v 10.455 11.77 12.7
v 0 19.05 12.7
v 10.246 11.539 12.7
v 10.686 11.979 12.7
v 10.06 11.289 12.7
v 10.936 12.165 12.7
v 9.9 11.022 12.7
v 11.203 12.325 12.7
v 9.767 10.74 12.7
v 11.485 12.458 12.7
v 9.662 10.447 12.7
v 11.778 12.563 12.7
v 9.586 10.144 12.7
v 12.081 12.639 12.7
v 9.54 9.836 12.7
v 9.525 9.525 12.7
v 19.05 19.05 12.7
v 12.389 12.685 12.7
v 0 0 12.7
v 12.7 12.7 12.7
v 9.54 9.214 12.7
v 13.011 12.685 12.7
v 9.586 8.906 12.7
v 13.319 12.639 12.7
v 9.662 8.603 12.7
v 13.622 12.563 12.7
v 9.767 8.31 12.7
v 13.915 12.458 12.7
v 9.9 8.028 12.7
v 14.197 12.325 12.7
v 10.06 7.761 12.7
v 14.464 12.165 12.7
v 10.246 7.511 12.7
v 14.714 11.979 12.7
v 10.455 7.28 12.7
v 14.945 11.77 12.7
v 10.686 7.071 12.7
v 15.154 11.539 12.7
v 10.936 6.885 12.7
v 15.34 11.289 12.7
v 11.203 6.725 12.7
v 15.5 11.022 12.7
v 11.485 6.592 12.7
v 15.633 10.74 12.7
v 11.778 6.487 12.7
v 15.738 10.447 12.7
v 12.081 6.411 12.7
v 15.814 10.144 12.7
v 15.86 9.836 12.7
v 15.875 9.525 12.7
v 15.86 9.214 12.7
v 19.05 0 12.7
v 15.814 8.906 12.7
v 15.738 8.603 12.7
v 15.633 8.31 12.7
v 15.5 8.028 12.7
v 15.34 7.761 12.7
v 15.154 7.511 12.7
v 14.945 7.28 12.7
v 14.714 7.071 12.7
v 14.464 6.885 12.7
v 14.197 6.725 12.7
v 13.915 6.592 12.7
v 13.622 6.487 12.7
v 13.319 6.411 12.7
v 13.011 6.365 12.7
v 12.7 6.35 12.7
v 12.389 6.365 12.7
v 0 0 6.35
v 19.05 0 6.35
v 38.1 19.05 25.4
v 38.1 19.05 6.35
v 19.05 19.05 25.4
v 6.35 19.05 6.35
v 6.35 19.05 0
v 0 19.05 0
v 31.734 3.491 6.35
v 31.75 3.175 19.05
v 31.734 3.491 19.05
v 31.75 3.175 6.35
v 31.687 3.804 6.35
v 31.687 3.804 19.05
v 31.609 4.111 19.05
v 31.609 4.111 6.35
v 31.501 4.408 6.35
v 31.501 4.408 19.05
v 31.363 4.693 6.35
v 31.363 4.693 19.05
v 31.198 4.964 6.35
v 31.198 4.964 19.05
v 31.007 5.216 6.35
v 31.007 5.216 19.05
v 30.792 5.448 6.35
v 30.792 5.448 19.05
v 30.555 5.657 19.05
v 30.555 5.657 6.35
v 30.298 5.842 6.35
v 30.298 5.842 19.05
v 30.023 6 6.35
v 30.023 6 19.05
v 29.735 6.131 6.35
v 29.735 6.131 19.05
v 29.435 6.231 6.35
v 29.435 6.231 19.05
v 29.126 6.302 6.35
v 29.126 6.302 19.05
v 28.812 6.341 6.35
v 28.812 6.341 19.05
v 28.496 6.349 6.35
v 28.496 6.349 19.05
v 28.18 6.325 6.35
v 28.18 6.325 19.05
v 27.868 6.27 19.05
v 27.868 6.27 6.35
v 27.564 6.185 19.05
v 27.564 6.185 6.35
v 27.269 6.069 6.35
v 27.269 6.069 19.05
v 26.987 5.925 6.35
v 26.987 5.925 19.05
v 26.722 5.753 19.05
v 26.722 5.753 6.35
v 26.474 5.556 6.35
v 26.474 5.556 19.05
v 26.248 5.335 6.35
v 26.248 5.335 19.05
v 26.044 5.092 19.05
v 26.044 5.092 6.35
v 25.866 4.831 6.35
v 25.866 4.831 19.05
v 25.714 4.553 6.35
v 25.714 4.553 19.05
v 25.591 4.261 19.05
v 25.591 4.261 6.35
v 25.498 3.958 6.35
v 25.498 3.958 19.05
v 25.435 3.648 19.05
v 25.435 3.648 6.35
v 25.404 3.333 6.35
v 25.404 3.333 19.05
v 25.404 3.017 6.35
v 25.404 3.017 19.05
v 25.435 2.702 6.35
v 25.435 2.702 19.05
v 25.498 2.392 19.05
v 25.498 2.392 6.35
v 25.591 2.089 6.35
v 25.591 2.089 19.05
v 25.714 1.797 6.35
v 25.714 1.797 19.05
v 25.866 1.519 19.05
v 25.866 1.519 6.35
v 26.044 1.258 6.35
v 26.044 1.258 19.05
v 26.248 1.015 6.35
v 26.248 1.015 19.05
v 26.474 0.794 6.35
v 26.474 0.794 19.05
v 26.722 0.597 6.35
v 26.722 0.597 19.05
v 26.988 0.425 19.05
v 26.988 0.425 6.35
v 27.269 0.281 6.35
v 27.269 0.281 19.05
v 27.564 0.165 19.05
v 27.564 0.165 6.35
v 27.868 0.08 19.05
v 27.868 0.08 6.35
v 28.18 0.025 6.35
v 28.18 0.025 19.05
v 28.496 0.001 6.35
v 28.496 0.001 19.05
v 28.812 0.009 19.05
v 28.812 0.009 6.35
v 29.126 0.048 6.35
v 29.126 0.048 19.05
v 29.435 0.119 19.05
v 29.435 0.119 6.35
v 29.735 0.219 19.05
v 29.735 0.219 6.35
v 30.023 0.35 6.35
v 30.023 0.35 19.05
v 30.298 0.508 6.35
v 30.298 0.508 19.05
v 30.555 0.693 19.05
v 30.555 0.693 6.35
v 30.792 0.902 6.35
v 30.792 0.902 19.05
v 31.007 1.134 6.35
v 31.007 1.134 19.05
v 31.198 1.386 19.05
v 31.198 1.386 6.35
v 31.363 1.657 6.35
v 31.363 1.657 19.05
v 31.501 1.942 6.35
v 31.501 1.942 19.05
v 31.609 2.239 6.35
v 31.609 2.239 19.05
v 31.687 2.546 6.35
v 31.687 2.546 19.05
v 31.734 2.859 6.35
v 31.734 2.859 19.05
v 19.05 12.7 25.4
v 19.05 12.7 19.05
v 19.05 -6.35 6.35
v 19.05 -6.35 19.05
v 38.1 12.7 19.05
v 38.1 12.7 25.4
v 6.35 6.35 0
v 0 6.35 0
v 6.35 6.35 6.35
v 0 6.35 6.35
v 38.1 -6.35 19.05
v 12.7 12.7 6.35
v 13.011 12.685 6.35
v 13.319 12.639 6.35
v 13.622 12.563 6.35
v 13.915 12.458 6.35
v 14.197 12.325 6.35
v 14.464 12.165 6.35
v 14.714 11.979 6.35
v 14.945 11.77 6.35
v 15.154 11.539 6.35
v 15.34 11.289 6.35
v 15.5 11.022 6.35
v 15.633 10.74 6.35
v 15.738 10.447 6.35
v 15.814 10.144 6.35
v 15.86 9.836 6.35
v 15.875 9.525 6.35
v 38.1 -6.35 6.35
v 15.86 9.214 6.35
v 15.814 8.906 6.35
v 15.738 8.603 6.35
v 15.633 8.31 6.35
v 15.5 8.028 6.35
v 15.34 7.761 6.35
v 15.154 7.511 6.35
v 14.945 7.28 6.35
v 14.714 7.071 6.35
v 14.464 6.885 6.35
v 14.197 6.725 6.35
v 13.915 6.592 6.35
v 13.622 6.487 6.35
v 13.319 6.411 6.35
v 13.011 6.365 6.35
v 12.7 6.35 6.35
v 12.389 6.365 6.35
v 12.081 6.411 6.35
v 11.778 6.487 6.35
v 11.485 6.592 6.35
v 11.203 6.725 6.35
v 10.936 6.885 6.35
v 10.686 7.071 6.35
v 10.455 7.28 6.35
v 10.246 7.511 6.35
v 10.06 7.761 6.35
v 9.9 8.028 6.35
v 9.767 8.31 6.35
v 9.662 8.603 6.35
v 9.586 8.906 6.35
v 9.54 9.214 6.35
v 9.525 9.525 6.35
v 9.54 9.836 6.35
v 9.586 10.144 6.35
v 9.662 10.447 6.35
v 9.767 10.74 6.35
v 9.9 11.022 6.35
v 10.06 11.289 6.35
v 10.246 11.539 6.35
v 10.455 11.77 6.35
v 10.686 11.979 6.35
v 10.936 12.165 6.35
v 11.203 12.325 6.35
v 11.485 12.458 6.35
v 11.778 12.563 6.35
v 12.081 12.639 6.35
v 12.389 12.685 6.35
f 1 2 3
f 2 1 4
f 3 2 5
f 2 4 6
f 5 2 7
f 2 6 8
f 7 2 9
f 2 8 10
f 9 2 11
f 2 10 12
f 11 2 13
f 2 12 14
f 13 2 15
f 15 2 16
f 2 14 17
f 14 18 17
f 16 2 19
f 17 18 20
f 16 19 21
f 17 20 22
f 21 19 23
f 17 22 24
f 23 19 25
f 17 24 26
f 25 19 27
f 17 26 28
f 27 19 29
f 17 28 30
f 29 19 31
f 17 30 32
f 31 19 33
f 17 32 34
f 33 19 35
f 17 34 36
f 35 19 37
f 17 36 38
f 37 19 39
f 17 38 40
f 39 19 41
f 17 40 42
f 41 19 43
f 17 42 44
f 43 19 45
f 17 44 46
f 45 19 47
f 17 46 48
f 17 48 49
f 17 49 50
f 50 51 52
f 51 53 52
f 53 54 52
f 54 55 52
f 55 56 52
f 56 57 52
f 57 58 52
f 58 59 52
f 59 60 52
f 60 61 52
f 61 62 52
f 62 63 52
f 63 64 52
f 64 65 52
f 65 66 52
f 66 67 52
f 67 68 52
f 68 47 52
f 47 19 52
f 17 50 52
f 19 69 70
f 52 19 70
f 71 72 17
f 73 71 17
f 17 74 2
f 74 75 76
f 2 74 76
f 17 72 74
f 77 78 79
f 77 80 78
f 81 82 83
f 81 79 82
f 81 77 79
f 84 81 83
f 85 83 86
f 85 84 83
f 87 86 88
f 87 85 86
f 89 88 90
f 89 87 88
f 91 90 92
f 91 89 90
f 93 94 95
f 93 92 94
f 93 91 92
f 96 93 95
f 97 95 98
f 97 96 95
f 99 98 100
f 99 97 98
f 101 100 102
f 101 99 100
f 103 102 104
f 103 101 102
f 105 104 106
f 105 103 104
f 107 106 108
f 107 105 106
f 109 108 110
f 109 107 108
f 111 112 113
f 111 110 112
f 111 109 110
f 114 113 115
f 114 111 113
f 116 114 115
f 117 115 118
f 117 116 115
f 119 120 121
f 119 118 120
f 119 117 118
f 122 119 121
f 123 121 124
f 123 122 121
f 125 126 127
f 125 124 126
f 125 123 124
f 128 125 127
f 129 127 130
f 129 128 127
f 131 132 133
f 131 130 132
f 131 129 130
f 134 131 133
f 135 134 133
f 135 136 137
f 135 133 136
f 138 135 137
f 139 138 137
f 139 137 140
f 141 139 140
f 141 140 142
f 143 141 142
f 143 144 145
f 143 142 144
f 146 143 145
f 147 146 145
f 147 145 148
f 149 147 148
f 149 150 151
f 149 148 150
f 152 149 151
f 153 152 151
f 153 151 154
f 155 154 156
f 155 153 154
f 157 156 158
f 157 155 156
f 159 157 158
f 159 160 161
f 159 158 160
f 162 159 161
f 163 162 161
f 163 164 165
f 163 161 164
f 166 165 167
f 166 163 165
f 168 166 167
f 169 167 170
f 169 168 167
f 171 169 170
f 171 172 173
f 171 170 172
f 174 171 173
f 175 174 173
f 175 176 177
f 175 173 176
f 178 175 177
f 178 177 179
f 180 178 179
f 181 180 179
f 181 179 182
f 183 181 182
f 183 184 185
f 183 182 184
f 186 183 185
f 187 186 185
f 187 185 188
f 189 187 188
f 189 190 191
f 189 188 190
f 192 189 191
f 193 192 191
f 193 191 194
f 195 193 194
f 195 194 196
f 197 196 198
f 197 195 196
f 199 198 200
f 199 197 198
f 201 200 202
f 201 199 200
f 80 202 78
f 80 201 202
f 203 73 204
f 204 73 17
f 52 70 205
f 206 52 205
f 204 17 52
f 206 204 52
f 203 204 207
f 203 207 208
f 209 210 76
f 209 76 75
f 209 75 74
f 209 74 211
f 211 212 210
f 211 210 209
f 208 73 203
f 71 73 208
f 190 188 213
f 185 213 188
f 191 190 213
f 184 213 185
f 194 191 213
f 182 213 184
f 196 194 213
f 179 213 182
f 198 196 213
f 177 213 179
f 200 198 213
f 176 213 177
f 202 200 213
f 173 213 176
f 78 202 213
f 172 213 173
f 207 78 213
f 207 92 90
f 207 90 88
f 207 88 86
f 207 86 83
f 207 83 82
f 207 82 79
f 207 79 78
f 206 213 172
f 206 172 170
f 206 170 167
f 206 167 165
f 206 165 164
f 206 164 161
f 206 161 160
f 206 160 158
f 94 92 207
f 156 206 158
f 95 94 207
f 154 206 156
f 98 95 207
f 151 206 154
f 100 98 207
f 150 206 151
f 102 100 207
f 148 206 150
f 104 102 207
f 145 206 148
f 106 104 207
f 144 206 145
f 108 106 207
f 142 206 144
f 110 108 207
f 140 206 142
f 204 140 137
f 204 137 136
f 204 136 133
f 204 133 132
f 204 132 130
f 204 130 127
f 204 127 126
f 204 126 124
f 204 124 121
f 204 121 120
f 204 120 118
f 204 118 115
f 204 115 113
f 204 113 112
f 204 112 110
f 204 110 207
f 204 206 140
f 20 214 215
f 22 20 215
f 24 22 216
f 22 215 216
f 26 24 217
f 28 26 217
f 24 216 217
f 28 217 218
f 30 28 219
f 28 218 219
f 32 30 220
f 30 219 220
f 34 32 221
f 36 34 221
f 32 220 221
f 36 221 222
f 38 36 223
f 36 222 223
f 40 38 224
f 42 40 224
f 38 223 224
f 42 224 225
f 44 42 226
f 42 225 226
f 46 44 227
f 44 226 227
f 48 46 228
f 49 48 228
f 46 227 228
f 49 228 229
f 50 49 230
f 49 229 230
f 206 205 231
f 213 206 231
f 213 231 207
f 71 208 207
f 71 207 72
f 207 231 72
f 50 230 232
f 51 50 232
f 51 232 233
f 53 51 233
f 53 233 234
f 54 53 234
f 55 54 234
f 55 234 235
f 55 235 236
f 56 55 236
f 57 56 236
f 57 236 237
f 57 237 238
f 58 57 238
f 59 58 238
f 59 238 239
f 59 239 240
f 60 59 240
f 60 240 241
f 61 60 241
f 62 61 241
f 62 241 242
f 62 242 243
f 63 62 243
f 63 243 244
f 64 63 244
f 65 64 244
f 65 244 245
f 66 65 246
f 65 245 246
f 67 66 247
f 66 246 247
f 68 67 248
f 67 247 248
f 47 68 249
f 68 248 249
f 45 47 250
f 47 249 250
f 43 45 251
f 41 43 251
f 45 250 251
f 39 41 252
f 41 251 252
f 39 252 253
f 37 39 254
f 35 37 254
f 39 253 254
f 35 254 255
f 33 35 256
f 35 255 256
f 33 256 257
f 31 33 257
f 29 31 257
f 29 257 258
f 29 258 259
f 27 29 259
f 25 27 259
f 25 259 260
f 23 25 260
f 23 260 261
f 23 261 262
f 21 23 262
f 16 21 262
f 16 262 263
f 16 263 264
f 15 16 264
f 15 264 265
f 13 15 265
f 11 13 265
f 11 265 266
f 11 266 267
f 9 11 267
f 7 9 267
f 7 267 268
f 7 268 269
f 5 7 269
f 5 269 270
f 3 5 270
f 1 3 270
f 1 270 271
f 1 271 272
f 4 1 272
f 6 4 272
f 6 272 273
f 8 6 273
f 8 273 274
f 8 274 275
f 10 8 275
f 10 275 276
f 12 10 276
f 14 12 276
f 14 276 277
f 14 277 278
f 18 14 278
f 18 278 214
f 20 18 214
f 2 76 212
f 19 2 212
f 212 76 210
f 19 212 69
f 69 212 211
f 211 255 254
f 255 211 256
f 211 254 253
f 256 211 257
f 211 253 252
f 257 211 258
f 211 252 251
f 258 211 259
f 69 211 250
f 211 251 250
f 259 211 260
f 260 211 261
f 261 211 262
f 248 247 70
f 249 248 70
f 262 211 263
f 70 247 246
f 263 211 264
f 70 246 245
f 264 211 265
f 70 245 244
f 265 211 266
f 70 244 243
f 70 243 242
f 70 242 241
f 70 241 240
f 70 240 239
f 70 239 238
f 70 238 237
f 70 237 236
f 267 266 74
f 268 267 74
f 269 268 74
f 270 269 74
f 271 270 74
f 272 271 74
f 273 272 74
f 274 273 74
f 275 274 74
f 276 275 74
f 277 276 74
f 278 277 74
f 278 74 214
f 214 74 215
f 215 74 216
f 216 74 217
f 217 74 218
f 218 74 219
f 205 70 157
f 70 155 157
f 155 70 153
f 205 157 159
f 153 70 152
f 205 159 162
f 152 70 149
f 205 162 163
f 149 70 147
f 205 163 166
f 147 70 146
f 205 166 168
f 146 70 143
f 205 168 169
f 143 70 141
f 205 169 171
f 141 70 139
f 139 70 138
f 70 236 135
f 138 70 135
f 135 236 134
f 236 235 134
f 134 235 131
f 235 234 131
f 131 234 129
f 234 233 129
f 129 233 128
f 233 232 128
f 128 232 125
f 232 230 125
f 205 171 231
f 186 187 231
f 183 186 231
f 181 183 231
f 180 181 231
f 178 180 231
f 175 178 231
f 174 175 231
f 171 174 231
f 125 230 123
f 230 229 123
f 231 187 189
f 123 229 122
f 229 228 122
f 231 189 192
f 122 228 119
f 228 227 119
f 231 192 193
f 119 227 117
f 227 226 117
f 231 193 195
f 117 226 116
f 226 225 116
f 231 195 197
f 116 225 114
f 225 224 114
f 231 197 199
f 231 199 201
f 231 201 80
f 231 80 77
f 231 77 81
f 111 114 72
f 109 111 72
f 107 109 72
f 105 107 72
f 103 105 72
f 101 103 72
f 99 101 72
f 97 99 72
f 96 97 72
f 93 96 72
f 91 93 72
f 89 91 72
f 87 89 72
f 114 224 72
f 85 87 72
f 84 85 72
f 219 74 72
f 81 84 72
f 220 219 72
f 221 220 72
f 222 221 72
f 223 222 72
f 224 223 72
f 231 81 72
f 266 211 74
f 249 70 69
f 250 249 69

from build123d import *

# Parameters (mm, degrees)
F0_R     = 3.175
F0_W     = 19.05
F0_H     = 6.35
F1_DEPTH = 25.4
F3_DEPTH = 6.35
F4_W     = 6.35
F4_H     = 6.35
F5_DEPTH = 6.35
F6_W     = 19.05
F6_H     = 6.35
F7_DEPTH = 38.1
F8_W     = 19.05
F8_H     = 12.7
F9_DEPTH = 25.4


with BuildPart() as f1:
    # F0 (on Top) → F1 (new body)
    with BuildSketch(Plane.XY):
        Polygon((0, 12.7), (0, 0), (19.05, 0), (19.05, 12.7), (12.7000000394, 12.7), align=None)
        with BuildLine():
            ThreePointArc((15.875, 9.525), (10.4549359558, 7.2799359837), (12.7000000394, 12.7))
            ThreePointArc((12.7000000394, 12.7), (14.9450640442, 11.7700640163), (15.875, 9.525))
        make_face(mode=Mode.SUBTRACT)
        Polygon((19.05, 12.7), (19.05, 0), (19.05, -6.35), (38.1, -6.35), (38.1, 12.7), align=None)
        with Locations((28.575, 3.175)):
            Circle(F0_R, mode=Mode.SUBTRACT)
        Polygon((0, 19.05), (0, 12.7), (12.7000000394, 12.7), (19.05, 12.7), (19.05, 19.05), align=None)
        with Locations((28.575, 15.875)):
            Rectangle(F0_W, F0_H)
    extrude(amount=F1_DEPTH)

    # F2 (on Top) → F3 (cut)
    with BuildSketch(Plane.XY):
        Polygon((38.1, 19.05), (6.35, 19.05), (6.35, 0), (19.05, 0), (19.05, -6.35), (38.1, -6.35), align=None)
    extrude(amount=F3_DEPTH, mode=Mode.SUBTRACT)

    # F4 (on Front) → F5 (cut)
    with BuildSketch(Plane.XZ):
        with Locations((3.175, 3.175)):
            Rectangle(F4_W, F4_H)
    extrude(amount=-F5_DEPTH, mode=Mode.SUBTRACT)

    # F6 (on Right) → F7 (cut)
    with BuildSketch(Plane.YZ):
        with Locations((3.175, 22.225)):
            Rectangle(F6_W, F6_H)
    extrude(amount=F7_DEPTH, mode=Mode.SUBTRACT)

    # F8 (on Front) → F9 (cut)
    with BuildSketch(Plane.XZ):
        with Locations((9.525, 19.05)):
            Rectangle(F8_W, F8_H)
    extrude(amount=-F9_DEPTH, mode=Mode.SUBTRACT)


solid = f1.part
